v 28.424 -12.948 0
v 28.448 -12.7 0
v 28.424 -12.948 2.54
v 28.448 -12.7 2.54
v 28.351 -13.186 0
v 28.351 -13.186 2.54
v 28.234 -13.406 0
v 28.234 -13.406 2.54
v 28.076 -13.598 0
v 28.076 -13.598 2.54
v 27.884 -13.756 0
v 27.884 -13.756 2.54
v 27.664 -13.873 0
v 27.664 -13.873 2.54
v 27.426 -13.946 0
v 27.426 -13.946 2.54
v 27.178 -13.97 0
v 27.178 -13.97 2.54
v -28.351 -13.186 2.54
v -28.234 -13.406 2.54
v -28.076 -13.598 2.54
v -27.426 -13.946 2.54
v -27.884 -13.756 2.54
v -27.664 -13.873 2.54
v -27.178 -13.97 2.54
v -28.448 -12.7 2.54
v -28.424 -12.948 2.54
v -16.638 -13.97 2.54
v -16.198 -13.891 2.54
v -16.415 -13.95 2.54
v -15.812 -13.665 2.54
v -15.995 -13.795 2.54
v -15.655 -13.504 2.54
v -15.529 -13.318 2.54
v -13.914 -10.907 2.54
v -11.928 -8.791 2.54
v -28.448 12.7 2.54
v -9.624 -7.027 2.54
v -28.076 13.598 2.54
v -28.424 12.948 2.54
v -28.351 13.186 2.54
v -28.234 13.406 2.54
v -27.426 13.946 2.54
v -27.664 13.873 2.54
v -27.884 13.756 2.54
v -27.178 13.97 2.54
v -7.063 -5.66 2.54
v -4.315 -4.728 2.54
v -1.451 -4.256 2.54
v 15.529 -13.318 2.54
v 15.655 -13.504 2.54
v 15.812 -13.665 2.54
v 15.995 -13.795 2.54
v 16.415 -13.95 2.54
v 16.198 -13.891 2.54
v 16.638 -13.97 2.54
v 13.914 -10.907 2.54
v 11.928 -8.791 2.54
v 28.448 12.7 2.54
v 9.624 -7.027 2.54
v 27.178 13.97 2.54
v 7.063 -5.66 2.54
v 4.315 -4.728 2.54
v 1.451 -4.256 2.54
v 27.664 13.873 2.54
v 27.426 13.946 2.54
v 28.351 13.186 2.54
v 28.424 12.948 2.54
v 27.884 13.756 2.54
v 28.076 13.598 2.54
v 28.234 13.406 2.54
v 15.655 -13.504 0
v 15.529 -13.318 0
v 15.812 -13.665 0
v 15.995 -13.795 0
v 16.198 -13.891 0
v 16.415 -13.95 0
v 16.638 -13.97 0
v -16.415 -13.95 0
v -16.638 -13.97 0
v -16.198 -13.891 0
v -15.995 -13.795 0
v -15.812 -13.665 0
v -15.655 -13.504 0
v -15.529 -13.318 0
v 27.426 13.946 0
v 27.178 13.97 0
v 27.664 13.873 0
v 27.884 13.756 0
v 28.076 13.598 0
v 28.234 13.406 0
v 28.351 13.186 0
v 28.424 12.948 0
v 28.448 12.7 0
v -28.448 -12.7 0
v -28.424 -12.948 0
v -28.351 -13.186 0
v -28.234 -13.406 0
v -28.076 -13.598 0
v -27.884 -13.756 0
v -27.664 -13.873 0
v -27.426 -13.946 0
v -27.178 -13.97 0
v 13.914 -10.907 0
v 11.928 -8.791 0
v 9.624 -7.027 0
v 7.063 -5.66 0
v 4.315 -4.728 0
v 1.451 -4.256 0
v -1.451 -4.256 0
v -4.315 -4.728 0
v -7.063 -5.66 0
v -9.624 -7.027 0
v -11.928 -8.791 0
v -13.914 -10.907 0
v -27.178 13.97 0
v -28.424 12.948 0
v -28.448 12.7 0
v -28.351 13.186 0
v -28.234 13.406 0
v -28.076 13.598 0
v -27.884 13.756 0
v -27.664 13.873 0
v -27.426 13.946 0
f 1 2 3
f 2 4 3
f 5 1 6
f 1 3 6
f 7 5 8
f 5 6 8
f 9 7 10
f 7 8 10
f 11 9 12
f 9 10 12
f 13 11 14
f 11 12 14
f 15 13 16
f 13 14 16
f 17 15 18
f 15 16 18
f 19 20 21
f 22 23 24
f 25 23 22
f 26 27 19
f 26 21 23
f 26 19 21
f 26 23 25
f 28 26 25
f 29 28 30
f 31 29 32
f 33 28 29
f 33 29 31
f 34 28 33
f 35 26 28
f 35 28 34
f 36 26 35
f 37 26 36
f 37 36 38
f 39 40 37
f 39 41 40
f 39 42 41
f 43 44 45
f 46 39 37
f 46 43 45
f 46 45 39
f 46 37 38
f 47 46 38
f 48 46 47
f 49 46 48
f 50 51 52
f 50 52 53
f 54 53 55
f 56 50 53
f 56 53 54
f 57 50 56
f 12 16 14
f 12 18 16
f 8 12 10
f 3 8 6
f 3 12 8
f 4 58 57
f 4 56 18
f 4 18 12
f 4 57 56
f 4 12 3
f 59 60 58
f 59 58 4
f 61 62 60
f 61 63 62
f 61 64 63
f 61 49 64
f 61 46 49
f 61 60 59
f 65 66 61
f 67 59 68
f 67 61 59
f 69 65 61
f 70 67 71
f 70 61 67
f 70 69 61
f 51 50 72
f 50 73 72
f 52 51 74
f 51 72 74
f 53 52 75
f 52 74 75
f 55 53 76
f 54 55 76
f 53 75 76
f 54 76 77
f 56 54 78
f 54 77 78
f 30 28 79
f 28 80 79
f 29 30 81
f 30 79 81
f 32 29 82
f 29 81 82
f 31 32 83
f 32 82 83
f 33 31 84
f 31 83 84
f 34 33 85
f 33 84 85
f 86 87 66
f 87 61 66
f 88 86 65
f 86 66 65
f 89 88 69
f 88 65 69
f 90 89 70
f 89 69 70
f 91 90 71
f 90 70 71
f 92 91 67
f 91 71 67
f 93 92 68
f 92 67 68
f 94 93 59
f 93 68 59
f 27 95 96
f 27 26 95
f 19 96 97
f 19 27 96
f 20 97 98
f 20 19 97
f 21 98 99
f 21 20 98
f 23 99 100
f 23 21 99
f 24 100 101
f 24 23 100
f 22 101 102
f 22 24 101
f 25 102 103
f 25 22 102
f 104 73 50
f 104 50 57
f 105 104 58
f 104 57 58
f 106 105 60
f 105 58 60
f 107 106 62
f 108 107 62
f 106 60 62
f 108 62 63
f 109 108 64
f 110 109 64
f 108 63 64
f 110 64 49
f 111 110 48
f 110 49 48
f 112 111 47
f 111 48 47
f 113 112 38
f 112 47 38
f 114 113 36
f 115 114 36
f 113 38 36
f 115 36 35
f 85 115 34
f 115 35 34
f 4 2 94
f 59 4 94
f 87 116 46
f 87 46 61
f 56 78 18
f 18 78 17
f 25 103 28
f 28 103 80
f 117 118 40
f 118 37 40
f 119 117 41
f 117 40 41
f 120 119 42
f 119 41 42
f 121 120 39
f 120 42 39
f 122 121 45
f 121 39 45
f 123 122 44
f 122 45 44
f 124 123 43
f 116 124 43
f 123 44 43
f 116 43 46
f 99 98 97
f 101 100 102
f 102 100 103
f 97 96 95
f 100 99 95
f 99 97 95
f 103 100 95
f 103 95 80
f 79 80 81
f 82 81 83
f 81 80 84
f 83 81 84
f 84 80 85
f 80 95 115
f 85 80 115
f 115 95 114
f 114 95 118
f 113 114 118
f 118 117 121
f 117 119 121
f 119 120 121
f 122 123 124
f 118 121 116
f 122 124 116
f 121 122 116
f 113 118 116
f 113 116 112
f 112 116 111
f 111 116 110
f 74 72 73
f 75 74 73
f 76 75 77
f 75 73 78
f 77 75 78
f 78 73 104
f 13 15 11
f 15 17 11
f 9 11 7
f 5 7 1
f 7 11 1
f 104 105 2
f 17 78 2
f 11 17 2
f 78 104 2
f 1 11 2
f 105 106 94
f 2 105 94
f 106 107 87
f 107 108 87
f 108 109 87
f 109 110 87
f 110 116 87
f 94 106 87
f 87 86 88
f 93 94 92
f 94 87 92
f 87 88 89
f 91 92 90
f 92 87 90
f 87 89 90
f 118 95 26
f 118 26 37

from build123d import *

# Parameters (mm, degrees)
SKETCH1_W           = 56.896
SKETCH1_H           = 27.94
BOSS_EXTRUDE1_DEPTH = 2.54
CUT_EXTRUDE1_DEPTH  = 3.54
FILLET1_R           = 1.27


with BuildPart() as part:
    # Sketch1 → Boss-Extrude1 (new body)
    with BuildSketch(Plane.XY):
        Rectangle(SKETCH1_W, SKETCH1_H)
    extrude(amount=BOSS_EXTRUDE1_DEPTH)

    # Sketch2 → Cut-Extrude1 (cut, through all)
    with BuildSketch(Plane.XY.offset(2.54)):
        with BuildLine():
            Line((-15.875, -13.97), (15.875, -13.97))
            ThreePointArc((15.875, -13.97), (0, -4.197045335), (-15.875, -13.97))
        make_face()
    extrude(amount=-CUT_EXTRUDE1_DEPTH, mode=Mode.SUBTRACT)

    # Fillet1
    fillet1_edges = [part.edges().sort_by_distance(p)[0] for p in [
        (-15.875, -13.97, 1.27),
        (15.875, -13.97, 1.27),
        (28.448, -13.97, 1.27),
        (-28.448, -13.97, 1.27),
        (-28.448, 13.97, 1.27),
        (28.448, 13.97, 1.27),
    ]]
    fillet(fillet1_edges, radius=FILLET1_R)


solid = part.part
